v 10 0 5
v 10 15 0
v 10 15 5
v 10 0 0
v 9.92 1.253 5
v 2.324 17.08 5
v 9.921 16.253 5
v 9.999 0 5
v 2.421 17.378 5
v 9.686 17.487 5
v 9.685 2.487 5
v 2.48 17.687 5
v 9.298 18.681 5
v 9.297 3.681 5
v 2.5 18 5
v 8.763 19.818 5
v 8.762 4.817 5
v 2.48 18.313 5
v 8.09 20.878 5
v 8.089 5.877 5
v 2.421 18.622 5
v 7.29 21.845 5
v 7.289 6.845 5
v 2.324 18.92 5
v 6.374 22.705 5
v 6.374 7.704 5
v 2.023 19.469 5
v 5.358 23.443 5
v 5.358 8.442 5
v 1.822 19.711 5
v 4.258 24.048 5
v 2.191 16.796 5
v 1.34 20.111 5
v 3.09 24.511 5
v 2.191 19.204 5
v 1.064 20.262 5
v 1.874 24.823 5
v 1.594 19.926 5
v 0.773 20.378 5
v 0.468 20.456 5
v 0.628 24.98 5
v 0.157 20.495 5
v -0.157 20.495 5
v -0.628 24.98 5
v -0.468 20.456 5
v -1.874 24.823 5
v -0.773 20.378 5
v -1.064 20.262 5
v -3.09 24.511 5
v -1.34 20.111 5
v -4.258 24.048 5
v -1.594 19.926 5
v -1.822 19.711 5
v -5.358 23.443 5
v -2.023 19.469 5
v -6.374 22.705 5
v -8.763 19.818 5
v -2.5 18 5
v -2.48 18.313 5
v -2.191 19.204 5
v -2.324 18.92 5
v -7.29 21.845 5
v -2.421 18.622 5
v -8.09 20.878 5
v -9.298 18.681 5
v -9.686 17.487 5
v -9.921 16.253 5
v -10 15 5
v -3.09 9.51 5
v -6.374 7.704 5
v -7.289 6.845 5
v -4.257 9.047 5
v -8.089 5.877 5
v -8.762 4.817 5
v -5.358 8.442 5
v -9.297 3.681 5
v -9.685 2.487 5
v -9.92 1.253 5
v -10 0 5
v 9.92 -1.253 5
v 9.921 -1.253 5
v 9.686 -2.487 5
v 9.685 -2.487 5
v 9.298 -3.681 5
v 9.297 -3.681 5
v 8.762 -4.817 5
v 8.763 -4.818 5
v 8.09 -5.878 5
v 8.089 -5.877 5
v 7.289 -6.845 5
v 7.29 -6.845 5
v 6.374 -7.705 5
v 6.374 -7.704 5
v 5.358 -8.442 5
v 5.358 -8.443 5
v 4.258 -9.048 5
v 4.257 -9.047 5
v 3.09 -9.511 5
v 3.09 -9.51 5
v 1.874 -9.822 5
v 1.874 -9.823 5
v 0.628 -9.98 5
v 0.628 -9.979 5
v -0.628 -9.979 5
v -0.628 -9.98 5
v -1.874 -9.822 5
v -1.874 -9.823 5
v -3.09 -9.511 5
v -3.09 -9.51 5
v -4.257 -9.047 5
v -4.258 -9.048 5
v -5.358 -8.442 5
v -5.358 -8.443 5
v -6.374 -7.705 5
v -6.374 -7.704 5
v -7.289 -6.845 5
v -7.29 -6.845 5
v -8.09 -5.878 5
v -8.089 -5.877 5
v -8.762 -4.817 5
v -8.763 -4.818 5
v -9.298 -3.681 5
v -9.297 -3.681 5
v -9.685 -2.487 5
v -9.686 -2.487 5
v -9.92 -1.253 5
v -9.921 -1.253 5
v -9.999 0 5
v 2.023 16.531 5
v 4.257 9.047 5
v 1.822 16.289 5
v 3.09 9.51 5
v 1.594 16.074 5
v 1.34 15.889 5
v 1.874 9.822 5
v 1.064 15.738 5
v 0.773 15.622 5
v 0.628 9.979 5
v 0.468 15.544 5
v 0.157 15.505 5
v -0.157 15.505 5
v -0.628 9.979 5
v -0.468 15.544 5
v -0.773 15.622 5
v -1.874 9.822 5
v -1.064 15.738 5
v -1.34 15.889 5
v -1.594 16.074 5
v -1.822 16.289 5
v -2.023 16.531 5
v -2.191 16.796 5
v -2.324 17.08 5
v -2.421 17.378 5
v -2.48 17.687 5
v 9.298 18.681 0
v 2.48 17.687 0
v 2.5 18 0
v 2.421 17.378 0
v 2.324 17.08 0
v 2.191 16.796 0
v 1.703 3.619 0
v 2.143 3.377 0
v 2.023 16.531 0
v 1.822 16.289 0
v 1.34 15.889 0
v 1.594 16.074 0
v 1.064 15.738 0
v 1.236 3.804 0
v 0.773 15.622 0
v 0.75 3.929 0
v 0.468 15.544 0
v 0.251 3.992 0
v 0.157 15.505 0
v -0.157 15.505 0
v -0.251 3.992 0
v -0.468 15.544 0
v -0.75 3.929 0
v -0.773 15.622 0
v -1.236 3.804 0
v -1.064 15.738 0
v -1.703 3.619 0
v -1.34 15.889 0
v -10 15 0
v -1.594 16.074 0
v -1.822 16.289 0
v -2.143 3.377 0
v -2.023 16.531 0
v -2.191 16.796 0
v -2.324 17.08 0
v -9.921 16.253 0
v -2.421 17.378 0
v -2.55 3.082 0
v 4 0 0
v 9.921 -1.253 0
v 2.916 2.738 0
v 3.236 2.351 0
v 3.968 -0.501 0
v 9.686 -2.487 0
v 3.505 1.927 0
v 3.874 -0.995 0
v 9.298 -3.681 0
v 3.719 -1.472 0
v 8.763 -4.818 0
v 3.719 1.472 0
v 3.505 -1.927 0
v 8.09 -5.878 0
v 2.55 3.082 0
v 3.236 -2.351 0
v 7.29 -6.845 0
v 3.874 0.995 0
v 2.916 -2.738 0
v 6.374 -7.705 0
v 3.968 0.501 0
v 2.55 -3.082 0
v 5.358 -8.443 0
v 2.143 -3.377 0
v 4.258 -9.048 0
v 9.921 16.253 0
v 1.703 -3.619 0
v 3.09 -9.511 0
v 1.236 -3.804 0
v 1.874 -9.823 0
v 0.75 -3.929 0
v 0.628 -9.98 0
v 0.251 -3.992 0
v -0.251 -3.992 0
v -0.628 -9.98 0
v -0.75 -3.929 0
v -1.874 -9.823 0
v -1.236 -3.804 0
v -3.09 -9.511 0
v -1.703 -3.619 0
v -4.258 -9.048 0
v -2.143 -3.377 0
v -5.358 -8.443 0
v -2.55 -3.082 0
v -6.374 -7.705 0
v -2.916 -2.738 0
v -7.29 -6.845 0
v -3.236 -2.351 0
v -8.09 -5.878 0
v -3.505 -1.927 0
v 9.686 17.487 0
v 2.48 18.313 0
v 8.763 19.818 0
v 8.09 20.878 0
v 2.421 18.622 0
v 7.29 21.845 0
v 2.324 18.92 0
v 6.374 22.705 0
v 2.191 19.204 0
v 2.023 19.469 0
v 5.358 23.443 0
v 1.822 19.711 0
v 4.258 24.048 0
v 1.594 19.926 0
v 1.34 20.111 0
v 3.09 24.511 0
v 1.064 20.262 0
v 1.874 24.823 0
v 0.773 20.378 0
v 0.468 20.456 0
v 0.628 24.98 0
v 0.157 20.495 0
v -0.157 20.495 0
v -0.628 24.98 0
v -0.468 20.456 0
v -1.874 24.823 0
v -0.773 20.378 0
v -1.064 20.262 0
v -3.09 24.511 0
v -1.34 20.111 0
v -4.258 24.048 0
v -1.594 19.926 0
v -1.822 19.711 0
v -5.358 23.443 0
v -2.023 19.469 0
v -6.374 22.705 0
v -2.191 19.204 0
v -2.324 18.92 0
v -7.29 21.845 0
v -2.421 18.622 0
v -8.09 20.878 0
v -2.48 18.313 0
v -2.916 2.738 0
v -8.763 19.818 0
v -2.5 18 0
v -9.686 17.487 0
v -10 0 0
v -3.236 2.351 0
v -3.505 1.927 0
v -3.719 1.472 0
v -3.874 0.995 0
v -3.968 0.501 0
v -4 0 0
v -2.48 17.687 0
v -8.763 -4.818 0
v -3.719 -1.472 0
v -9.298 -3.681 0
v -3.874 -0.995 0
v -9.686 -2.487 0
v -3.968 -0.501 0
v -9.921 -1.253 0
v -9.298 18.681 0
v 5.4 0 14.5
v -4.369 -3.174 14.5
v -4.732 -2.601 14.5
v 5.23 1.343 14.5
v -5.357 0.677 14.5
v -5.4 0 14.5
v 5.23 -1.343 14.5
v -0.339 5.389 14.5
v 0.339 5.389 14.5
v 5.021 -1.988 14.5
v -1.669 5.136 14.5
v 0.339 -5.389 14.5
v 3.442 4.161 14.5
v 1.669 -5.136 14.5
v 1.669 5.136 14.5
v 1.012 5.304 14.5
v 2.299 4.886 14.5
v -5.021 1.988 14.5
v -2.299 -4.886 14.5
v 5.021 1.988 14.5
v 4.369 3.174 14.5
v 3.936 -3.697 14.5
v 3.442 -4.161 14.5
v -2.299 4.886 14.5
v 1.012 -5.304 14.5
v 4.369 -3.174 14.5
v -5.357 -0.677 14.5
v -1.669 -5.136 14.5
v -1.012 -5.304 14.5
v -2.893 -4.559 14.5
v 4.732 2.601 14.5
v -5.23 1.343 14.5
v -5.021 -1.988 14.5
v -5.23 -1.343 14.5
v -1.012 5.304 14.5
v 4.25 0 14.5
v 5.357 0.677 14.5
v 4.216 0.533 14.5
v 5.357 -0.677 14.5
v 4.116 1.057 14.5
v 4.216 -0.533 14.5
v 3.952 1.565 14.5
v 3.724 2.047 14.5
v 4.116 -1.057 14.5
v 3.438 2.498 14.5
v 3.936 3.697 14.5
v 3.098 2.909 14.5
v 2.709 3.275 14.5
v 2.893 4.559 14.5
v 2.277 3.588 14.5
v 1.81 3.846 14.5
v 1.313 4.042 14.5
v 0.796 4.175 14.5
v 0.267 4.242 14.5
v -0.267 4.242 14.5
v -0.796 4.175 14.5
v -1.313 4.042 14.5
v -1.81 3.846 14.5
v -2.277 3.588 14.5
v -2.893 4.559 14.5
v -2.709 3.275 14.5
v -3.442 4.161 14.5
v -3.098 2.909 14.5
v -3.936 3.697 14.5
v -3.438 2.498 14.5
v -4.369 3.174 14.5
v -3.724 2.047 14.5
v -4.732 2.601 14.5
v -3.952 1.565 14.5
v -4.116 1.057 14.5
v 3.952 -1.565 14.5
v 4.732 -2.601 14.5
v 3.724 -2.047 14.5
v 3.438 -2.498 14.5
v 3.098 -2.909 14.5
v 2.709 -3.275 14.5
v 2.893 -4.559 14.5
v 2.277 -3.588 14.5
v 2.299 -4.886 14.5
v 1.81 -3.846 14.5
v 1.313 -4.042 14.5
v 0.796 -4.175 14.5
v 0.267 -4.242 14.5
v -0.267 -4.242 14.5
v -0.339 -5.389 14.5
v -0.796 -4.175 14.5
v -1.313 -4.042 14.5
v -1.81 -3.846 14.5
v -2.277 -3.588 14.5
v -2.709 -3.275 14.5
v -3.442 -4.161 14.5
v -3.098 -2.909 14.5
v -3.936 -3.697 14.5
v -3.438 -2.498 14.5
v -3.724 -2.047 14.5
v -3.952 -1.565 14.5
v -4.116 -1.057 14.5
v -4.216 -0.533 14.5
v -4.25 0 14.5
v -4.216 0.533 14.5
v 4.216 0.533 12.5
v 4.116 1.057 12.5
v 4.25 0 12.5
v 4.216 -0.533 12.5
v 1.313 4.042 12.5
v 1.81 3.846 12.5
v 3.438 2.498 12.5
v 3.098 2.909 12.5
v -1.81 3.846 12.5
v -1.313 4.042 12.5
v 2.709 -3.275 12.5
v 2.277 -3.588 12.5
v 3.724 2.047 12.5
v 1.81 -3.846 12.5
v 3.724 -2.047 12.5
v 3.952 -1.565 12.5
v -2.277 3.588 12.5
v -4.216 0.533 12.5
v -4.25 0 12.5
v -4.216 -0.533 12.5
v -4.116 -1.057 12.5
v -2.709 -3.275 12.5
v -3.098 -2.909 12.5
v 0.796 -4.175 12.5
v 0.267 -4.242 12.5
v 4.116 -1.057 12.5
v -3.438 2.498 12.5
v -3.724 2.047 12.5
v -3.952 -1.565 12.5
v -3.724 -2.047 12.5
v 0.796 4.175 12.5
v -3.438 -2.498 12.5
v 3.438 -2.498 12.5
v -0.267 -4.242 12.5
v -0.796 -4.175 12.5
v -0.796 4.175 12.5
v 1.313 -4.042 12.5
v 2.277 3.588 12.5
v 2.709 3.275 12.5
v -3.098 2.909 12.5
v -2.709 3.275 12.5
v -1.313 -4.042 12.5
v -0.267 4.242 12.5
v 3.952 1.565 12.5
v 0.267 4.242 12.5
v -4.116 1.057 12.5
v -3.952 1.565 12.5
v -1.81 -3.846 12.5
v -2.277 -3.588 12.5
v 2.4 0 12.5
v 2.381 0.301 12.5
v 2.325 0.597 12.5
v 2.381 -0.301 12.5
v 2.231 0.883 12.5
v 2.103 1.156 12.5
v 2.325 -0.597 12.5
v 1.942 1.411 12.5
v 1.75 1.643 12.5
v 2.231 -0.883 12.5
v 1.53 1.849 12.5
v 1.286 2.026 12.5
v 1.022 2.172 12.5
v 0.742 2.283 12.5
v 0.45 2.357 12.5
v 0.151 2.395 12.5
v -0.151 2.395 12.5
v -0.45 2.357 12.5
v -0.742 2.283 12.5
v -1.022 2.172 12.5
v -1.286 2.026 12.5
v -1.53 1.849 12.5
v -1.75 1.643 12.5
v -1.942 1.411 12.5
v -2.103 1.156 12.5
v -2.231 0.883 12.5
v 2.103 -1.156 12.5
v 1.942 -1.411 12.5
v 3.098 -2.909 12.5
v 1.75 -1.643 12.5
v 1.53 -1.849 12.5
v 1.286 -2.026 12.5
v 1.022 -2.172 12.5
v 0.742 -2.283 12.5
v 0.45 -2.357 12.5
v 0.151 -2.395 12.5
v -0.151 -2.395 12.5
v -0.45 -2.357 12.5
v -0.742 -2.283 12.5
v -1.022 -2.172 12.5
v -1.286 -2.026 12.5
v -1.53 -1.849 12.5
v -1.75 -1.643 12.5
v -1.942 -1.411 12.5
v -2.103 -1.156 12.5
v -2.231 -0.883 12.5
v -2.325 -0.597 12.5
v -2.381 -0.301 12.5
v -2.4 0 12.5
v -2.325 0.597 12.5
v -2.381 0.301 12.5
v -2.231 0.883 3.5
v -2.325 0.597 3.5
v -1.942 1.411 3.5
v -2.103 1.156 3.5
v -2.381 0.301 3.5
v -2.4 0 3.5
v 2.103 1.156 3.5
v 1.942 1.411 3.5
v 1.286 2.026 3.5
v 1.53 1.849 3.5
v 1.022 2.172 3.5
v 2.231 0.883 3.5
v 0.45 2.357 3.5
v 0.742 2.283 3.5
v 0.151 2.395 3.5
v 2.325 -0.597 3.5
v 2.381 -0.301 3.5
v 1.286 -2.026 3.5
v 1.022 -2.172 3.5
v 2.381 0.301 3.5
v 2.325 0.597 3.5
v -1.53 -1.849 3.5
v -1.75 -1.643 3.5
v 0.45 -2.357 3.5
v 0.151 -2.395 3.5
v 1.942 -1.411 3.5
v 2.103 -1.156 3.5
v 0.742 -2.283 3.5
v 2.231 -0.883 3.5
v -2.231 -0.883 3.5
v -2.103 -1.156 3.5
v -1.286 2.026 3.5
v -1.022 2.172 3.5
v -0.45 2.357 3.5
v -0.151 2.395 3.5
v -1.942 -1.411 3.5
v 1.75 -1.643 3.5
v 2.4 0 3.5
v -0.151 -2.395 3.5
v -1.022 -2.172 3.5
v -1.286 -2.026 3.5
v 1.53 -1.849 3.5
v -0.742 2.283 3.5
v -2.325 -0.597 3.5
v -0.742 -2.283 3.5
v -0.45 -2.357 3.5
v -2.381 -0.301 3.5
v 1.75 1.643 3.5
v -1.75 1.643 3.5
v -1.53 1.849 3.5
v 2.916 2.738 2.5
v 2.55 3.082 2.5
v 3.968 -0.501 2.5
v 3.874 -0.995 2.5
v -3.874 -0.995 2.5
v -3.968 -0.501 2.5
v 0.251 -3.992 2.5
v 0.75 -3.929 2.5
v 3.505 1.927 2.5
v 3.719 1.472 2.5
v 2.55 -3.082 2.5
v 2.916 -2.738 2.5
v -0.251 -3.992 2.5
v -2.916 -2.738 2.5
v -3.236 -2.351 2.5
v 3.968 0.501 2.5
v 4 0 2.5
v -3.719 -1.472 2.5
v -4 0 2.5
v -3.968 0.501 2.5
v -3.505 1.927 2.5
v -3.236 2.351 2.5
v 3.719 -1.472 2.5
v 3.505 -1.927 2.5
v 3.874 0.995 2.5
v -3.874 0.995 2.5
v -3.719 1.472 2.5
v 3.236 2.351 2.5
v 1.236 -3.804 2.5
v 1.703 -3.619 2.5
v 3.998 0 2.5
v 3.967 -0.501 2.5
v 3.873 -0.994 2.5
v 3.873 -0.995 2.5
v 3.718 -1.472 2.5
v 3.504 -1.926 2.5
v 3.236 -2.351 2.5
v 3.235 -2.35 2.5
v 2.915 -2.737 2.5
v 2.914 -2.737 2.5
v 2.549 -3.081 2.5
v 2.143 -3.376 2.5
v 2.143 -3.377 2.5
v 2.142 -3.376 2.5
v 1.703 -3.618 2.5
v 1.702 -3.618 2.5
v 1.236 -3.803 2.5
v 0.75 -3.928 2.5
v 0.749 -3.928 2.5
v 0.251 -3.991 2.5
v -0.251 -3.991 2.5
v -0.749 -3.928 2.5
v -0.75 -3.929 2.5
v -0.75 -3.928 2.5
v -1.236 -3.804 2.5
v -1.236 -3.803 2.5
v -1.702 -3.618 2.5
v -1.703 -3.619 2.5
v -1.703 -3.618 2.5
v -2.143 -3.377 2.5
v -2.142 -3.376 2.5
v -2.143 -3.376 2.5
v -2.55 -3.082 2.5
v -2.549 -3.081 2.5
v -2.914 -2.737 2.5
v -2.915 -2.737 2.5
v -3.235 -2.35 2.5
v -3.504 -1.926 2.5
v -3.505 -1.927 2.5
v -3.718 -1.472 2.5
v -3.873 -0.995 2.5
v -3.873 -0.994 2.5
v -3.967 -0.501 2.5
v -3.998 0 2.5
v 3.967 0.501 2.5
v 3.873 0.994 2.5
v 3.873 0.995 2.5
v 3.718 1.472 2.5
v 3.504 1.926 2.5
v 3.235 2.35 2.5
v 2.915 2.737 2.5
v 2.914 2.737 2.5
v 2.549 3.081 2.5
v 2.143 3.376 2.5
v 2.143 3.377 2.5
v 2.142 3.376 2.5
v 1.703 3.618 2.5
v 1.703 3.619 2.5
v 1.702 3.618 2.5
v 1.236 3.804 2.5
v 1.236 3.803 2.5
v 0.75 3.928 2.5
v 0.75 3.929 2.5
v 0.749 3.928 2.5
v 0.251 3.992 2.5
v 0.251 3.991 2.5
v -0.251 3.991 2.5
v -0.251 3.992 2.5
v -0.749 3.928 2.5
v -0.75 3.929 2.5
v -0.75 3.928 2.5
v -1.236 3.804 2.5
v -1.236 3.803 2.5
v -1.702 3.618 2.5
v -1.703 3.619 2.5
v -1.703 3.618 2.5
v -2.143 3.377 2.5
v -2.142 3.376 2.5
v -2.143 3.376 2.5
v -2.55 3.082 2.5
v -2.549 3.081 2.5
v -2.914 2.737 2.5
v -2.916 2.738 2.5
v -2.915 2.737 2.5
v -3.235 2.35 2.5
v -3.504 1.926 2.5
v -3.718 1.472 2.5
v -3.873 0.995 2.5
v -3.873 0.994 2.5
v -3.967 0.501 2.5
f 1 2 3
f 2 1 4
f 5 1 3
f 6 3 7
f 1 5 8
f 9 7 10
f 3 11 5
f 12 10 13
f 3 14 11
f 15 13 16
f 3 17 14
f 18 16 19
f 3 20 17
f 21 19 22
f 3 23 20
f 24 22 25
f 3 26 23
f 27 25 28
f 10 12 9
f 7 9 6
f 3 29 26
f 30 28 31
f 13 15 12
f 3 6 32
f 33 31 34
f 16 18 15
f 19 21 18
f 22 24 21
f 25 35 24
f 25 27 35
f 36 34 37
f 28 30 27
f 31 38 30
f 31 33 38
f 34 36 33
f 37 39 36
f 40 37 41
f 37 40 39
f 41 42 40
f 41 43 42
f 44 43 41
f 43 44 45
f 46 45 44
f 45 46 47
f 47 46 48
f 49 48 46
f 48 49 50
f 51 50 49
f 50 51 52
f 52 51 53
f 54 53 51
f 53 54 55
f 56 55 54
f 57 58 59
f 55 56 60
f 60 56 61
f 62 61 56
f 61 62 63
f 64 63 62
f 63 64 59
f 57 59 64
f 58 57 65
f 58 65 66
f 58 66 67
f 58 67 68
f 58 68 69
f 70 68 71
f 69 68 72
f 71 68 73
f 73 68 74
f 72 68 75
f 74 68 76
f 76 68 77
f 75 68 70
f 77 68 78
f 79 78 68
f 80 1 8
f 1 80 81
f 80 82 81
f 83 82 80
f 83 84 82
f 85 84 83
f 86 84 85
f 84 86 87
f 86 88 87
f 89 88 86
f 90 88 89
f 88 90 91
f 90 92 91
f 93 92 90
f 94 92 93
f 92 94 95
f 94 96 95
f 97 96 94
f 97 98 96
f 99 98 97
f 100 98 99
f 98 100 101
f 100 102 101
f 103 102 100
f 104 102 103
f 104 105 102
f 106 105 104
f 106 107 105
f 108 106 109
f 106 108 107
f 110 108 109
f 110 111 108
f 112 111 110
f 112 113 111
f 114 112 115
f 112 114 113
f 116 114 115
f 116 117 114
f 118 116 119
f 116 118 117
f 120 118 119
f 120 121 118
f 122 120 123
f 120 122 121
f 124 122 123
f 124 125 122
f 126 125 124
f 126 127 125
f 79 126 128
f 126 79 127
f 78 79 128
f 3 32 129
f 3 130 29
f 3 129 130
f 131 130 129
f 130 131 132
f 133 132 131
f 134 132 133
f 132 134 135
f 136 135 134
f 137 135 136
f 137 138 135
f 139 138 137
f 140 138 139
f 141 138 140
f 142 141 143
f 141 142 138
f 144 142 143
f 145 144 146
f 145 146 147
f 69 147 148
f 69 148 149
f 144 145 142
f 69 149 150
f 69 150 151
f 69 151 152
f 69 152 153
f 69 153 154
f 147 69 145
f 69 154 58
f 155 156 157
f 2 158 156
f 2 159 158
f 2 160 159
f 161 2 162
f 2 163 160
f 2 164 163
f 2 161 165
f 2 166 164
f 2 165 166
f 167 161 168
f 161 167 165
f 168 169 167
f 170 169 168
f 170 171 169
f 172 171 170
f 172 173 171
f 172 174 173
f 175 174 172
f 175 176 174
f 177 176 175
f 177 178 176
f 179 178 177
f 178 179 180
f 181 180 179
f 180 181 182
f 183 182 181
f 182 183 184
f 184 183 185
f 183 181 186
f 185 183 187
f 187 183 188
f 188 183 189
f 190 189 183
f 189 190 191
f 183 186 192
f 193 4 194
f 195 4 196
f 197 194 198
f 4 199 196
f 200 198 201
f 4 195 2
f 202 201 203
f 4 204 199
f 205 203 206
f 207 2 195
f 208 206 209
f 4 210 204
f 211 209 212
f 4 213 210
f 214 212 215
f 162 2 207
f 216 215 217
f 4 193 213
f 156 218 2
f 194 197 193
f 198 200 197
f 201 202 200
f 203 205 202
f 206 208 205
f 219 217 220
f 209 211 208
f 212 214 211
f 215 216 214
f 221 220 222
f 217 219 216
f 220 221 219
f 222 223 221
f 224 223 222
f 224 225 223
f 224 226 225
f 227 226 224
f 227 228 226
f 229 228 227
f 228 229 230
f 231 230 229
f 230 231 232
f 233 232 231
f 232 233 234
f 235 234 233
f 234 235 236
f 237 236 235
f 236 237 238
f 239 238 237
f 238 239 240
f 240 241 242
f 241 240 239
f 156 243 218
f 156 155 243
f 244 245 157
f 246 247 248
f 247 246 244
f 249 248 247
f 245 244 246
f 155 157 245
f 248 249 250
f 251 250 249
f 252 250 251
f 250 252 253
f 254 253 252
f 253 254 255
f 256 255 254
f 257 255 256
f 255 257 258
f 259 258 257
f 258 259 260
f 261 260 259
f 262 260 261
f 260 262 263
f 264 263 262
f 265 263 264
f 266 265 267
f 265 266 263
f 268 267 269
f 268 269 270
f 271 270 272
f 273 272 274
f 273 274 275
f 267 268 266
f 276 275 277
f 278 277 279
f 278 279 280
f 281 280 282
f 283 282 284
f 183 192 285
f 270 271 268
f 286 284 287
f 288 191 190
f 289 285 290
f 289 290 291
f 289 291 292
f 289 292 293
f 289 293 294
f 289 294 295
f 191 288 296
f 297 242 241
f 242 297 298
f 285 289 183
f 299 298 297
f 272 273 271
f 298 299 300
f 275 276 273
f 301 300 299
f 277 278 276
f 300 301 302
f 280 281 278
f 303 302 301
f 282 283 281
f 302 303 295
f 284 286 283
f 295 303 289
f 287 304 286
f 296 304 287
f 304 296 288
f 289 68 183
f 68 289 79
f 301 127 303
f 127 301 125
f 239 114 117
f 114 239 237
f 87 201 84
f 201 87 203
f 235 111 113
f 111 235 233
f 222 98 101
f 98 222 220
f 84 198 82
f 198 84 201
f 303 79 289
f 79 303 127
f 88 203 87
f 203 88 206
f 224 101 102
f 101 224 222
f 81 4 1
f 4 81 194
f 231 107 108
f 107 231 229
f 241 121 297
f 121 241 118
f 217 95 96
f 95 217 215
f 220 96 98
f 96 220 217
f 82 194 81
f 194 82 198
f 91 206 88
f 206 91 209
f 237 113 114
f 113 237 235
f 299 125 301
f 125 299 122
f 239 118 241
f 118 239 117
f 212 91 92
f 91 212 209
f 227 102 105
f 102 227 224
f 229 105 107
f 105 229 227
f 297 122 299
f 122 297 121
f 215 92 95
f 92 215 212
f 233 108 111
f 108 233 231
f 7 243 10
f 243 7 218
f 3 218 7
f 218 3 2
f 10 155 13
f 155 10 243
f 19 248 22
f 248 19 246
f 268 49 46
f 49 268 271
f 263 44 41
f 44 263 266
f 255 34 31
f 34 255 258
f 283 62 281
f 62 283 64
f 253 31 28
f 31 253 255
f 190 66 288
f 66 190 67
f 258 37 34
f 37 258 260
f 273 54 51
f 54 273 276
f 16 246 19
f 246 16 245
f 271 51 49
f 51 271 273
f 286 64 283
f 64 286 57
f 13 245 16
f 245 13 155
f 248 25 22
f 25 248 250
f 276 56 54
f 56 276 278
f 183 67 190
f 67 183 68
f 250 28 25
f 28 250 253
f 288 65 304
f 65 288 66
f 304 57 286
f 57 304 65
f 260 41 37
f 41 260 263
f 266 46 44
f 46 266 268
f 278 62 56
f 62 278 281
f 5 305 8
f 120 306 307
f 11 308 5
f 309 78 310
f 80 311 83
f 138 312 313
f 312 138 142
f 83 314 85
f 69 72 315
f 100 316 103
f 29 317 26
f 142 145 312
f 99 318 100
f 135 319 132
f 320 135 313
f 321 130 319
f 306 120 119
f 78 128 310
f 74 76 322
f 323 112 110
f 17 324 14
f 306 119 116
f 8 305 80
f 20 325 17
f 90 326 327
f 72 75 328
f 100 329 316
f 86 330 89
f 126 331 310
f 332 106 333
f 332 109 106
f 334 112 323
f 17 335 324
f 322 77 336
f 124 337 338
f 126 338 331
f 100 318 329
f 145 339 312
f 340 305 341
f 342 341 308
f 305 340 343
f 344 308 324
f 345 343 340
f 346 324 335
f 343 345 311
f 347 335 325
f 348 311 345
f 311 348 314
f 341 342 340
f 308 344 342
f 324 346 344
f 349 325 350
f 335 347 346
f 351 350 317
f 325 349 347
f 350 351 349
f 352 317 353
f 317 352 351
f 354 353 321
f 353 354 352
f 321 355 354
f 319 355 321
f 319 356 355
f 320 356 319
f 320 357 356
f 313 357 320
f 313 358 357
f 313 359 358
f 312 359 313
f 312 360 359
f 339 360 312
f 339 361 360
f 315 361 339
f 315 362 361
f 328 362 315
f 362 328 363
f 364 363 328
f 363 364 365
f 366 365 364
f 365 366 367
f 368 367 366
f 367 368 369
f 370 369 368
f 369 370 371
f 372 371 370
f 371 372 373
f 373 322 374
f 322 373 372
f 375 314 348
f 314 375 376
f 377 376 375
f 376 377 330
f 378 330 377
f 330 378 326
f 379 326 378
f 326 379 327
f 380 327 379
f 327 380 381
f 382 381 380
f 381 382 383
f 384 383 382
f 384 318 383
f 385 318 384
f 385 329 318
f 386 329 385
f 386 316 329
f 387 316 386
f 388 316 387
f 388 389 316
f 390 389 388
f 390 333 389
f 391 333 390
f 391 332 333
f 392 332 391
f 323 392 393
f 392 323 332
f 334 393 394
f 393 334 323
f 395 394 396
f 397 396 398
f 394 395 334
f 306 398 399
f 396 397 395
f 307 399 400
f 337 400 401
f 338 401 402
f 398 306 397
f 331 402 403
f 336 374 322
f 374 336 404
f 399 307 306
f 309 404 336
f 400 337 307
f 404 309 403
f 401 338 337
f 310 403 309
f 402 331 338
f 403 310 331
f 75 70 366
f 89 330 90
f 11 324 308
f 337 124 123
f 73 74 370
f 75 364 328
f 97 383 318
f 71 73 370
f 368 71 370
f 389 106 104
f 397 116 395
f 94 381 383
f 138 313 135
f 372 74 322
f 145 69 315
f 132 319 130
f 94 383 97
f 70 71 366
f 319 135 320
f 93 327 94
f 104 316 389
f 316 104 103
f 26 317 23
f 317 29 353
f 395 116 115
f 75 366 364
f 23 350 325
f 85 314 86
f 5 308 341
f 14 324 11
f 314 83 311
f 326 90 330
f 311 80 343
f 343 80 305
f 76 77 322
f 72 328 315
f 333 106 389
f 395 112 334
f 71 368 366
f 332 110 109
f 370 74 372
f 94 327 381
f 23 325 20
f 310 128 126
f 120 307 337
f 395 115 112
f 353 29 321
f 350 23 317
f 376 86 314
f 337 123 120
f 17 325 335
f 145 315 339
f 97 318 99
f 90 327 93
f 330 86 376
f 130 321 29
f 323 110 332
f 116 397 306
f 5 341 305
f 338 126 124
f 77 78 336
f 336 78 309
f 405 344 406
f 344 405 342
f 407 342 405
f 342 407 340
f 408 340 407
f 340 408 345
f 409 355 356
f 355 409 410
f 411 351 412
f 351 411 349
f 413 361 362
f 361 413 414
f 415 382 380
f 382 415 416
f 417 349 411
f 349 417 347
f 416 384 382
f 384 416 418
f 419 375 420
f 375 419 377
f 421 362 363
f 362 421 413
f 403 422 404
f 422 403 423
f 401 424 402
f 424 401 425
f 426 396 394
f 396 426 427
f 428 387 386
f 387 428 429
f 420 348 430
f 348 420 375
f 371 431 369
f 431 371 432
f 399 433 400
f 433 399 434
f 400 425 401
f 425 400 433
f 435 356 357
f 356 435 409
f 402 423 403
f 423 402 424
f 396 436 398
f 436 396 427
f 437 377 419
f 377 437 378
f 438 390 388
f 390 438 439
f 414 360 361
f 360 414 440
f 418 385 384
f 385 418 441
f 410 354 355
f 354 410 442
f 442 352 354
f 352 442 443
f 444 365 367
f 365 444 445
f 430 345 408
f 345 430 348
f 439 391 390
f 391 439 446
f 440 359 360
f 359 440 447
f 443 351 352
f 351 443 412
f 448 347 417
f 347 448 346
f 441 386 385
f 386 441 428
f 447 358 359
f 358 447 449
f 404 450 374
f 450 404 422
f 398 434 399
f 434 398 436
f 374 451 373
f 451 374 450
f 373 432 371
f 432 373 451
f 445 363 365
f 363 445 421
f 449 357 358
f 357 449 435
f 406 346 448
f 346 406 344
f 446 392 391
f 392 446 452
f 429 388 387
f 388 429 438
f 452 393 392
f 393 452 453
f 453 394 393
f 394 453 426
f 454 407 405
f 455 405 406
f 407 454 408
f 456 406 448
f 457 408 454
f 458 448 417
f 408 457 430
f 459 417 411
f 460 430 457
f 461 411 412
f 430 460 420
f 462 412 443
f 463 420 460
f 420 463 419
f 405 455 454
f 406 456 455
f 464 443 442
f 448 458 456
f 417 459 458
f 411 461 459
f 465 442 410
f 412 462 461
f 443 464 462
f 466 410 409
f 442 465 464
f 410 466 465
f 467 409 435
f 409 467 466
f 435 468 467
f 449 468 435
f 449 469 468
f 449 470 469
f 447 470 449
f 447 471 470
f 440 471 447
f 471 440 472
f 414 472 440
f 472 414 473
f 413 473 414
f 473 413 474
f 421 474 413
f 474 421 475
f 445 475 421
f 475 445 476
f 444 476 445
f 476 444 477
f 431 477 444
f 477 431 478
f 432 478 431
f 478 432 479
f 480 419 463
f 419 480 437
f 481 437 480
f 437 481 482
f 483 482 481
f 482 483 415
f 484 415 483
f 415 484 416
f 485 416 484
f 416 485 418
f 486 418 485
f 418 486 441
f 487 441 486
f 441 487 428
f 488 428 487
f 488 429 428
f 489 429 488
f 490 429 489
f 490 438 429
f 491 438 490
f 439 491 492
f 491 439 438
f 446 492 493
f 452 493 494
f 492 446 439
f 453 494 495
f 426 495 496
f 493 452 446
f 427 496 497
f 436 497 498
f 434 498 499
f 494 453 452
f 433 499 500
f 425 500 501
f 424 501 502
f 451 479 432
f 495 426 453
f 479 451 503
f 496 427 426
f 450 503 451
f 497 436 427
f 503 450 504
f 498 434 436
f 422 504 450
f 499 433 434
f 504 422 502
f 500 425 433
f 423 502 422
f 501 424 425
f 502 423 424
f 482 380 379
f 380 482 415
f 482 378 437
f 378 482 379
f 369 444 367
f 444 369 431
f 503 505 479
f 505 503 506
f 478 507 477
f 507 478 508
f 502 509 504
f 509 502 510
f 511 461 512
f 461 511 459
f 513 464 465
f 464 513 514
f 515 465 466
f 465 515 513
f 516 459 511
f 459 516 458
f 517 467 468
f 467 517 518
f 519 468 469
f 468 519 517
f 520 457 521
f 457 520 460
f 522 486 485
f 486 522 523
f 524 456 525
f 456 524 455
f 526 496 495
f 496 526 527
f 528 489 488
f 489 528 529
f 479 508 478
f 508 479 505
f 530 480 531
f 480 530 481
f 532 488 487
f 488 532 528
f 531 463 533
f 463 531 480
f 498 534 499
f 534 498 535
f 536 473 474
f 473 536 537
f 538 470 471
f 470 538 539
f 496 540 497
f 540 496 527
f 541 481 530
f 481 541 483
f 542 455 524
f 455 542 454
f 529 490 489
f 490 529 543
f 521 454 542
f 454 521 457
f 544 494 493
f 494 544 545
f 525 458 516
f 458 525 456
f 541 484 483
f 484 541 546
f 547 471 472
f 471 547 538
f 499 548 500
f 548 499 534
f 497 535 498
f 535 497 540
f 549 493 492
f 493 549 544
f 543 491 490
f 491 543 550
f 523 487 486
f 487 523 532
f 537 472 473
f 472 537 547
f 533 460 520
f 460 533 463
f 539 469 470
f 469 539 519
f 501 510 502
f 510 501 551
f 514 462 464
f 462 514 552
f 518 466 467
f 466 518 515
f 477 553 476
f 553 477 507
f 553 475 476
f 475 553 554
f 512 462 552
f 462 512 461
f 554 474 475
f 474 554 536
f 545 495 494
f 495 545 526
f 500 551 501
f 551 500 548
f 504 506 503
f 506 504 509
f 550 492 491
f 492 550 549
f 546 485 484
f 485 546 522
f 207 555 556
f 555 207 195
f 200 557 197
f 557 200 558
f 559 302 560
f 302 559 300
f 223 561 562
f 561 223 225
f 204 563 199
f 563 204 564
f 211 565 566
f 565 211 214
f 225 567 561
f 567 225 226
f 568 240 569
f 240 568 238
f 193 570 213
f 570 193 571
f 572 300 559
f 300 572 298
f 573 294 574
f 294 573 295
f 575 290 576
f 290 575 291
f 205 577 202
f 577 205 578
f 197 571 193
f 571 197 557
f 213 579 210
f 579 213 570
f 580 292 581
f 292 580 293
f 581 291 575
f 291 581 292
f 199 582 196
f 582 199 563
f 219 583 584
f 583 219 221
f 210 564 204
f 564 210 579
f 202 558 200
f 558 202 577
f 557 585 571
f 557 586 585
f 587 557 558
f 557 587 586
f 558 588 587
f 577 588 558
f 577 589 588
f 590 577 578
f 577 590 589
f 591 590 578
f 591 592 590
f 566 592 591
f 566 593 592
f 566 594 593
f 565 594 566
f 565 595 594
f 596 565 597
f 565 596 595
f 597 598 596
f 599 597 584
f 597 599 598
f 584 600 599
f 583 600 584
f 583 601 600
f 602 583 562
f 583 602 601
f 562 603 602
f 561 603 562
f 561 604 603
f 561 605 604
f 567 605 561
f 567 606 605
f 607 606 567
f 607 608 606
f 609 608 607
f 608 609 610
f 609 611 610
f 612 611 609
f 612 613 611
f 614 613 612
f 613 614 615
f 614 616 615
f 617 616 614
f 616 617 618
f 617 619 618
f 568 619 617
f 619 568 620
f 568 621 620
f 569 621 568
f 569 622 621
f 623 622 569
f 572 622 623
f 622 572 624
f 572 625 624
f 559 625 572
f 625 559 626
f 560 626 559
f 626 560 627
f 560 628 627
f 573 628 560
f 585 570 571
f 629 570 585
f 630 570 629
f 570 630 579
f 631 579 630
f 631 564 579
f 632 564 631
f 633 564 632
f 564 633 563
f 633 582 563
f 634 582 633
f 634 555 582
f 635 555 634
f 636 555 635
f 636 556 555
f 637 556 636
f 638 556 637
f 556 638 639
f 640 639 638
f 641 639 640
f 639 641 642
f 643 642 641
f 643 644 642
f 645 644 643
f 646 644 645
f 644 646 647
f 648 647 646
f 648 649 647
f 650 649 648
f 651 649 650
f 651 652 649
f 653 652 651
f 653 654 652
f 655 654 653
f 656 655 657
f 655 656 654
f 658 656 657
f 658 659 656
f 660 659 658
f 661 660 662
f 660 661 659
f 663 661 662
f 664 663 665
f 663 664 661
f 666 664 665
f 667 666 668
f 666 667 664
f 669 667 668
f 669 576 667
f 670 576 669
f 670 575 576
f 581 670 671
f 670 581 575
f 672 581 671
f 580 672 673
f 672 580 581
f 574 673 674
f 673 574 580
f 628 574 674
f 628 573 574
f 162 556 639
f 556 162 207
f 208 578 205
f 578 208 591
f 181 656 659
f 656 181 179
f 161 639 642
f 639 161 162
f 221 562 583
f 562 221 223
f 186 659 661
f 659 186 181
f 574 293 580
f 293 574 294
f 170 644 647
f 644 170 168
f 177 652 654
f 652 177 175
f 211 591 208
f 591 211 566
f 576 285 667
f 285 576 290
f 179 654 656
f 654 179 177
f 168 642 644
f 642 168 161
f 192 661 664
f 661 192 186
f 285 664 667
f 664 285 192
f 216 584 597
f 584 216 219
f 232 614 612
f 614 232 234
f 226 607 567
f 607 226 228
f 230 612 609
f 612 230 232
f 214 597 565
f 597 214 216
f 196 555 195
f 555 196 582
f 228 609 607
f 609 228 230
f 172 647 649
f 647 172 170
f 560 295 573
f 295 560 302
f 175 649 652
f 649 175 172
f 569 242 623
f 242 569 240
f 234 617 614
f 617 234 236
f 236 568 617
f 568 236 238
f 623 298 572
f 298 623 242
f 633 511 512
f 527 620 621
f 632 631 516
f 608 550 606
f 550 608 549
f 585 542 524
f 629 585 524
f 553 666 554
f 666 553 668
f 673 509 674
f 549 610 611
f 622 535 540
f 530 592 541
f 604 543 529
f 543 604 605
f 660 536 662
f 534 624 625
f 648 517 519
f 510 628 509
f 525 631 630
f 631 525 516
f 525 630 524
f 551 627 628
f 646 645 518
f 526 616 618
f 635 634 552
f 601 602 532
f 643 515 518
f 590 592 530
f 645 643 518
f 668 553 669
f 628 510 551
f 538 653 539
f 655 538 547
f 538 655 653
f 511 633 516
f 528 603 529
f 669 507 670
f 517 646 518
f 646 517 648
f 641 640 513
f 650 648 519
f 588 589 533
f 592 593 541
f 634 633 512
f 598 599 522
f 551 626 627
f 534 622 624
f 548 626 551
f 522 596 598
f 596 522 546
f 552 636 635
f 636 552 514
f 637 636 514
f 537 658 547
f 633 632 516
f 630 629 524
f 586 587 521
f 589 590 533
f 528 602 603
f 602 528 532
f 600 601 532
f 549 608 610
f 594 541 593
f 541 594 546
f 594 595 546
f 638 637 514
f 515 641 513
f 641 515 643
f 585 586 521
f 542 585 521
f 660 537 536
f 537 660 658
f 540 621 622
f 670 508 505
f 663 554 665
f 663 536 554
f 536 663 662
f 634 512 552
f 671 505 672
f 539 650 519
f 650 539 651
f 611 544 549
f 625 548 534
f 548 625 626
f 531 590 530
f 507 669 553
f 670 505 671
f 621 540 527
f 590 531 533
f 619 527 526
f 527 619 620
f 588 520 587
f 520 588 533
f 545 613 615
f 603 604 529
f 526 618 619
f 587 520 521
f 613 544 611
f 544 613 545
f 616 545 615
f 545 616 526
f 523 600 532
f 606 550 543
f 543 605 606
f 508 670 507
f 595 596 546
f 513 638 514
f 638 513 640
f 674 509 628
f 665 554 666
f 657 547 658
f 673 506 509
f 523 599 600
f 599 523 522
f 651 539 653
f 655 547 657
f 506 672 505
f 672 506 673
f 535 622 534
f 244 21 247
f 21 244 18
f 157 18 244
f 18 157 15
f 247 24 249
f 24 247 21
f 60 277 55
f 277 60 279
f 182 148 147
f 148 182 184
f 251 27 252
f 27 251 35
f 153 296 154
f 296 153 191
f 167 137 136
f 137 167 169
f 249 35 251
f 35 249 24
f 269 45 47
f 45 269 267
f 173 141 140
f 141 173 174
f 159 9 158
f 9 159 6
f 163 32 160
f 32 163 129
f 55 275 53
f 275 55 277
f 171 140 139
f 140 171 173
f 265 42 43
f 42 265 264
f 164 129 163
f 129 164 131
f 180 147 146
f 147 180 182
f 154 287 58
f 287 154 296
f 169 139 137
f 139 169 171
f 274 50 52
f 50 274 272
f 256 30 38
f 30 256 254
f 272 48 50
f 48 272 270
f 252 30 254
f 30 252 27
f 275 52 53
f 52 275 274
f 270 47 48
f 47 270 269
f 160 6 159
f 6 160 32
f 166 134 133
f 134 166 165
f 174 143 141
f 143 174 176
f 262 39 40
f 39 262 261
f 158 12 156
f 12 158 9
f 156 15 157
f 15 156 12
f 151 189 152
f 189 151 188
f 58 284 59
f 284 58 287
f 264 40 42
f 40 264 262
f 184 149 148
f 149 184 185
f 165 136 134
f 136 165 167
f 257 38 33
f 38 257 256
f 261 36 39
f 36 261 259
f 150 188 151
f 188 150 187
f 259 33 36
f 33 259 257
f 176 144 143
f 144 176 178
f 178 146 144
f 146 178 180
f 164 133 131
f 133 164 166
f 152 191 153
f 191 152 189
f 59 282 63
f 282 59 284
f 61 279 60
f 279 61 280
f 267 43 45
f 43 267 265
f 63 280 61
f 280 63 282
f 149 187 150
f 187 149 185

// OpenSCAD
h = 10;
ch= 5;
eh = 2;
hh = 2.5;
cl = 5;
th = 1;


difference()
{
    union(){
        translate( [ -10, 0, 0 ] )
            cube( [ 20, 10 + cl, ch ] );
        
        cylinder( d = 20, $fn = 50, h = ch );
        translate( [ 0, cl + 10, 0 ] )
            cylinder( d = 20, $fn = 50, h = ch );
        
        translate( [ 0, 0, ch - 1e-3 ] )
            cylinder( d1 = 20 - 1e-3, d2 = 7.6 + 1.6 * 2, $fn = 50, h = h - ch + 1e-3 + eh + hh );
    }
    
    translate( [ 0, 0, h + hh ] )
        cylinder( d = 8.5, h = 100, $fn = 50 );
    
    translate( [ 0, 0, -1 ] )
        cylinder( d = 4.8, h = 100, $fn = 50 );
    
    translate( [ 0, 0, -1 ] )
        cylinder( d = 8, h = hh + 1, $fn = 50 );

    translate( [ 0, 0, hh - 1e-3 ] )
        cylinder( d1 = 8, d2 = 4.8, h = th + 1e-3, $fn = 50 );

    translate( [ 0, cl + 10 + 3, -1 ] )
        cylinder( d = 5, $fn = 50, h = 100 );
}
